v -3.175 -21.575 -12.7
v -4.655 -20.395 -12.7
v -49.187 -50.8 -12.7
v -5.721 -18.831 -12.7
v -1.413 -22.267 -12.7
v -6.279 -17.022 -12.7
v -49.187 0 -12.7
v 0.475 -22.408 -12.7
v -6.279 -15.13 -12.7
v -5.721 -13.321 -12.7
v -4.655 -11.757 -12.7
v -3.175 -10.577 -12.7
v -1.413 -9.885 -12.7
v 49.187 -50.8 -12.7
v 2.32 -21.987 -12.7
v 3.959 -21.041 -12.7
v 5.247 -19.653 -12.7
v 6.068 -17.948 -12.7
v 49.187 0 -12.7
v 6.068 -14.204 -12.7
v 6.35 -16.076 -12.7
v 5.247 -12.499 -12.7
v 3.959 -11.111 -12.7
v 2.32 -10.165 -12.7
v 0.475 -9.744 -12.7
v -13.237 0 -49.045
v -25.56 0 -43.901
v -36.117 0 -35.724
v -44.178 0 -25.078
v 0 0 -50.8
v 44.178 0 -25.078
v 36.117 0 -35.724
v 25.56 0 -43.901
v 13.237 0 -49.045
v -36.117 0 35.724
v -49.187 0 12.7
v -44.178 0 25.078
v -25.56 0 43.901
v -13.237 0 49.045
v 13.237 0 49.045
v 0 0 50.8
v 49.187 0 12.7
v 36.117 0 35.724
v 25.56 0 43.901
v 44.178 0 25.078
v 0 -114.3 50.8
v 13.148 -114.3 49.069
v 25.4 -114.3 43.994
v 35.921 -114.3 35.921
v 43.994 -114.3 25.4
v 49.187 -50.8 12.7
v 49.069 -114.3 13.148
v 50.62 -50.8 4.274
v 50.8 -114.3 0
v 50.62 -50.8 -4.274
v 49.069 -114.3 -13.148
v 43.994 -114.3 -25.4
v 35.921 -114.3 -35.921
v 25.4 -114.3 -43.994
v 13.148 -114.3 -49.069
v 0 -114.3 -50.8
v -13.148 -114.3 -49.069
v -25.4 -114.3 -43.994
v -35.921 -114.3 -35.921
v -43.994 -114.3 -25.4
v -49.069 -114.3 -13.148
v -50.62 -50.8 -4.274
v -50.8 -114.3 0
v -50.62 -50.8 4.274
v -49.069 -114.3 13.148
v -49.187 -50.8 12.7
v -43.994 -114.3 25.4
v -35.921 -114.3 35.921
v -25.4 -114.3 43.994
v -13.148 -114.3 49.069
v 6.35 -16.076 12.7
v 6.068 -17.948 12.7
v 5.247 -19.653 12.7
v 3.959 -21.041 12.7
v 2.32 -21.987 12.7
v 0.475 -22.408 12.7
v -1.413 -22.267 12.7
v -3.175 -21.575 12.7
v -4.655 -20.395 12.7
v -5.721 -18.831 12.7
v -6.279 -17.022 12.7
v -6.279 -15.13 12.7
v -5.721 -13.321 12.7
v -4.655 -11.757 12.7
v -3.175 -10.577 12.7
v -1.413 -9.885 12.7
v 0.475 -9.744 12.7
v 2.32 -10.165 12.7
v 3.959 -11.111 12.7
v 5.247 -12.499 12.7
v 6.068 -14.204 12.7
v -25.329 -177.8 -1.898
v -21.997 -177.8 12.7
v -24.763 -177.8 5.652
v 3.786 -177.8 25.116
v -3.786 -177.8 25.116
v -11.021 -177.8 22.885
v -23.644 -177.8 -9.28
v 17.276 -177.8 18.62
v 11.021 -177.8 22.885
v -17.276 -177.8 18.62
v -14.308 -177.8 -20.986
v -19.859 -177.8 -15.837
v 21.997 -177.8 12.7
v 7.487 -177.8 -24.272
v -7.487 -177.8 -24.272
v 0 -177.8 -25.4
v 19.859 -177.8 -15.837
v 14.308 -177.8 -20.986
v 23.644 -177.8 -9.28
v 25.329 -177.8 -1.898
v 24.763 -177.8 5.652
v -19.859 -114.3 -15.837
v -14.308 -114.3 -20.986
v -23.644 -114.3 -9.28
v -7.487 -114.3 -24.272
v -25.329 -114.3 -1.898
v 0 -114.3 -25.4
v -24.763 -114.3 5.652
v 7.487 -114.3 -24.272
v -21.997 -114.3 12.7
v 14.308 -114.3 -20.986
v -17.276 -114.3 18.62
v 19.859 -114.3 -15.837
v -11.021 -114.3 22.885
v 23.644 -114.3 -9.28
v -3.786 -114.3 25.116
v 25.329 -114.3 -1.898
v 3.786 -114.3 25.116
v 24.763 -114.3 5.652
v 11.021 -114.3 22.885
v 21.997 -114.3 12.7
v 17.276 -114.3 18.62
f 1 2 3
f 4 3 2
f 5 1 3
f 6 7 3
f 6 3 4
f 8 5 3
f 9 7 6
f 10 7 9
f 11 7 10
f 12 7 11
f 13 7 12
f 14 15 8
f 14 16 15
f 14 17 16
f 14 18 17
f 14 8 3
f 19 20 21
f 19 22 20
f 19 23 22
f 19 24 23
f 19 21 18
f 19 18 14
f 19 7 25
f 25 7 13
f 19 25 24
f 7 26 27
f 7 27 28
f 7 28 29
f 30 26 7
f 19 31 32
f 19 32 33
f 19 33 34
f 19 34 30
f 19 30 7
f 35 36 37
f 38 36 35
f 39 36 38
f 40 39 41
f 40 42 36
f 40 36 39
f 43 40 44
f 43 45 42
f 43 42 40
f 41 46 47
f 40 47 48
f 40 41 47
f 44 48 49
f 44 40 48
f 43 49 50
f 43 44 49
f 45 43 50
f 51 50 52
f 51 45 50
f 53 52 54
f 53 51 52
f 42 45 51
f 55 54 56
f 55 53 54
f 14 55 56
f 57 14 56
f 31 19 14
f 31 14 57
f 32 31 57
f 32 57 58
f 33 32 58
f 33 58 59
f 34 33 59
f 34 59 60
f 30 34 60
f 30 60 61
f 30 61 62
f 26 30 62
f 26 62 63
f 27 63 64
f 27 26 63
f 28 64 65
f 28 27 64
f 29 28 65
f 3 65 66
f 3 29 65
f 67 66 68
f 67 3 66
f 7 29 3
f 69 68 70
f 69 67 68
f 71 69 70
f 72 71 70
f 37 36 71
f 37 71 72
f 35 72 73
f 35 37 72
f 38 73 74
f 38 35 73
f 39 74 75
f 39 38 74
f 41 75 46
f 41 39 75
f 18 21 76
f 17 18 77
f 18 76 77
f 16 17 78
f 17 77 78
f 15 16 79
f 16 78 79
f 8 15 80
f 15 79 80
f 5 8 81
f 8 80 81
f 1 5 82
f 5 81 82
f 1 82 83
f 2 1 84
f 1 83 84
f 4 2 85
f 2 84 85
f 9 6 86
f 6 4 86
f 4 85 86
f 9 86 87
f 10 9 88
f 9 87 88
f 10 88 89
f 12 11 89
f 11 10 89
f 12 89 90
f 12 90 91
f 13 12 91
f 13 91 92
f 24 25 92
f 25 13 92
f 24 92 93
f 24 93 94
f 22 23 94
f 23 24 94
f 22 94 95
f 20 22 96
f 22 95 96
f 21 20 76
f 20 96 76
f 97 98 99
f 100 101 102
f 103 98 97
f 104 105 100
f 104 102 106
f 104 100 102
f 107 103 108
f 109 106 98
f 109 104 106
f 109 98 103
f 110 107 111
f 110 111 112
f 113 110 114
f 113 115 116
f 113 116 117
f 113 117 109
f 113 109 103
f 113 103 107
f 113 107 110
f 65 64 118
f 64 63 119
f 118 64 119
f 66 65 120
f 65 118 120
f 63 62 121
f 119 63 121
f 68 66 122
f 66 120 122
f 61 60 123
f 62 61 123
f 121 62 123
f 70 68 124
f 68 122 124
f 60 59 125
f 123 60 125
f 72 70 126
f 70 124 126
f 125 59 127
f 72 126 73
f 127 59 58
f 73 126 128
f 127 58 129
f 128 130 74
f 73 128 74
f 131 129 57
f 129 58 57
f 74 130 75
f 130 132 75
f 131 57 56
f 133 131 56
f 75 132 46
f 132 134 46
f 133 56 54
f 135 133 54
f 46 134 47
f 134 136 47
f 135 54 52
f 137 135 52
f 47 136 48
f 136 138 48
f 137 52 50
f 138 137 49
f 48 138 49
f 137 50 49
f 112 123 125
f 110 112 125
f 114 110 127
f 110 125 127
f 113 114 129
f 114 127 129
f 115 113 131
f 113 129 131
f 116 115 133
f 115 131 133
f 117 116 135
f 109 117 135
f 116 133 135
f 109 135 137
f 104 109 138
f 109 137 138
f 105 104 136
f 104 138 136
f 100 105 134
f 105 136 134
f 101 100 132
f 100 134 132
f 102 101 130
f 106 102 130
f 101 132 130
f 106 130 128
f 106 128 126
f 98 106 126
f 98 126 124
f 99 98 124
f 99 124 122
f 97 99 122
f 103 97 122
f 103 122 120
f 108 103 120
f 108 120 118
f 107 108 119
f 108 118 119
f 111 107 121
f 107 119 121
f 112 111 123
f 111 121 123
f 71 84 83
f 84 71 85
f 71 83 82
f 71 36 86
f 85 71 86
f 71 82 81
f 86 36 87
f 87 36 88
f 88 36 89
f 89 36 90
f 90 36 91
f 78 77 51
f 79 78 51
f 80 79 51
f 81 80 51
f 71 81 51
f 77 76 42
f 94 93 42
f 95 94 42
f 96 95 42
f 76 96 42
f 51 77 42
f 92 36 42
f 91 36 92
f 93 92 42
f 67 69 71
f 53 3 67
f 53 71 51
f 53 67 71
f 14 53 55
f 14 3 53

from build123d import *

# Parameters (mm, degrees)
SKETCH1_R           = 50.8
BOSS_EXTRUDE1_DEPTH = 114.3
SKETCH2_R           = 25.4
BOSS_EXTRUDE2_DEPTH = 63.5
SKETCH3_W           = 130.646832002
SKETCH3_H           = 25.4
CUT_EXTRUDE5_DEPTH  = 50.8
SKETCH5_R           = 6.35
BOSS_EXTRUDE3_DEPTH = 50.8


with BuildPart() as part:
    # Sketch1 → Boss-Extrude1 (new body)
    with BuildSketch(Plane(origin=(0, 0, 0), x_dir=(1, 0, 0), z_dir=(0, 1, 0))):
        with Locations(Location((0, 0, 0), (0, 0, 270))):
            Circle(SKETCH1_R)
    extrude(amount=-BOSS_EXTRUDE1_DEPTH)

    # Sketch2 → Boss-Extrude2 (add)
    with BuildSketch(Plane(origin=(0, -114.3, 0), x_dir=(-1, 0, 0), z_dir=(0, -1, 0))):
        with Locations(Location((0, 0, 0), (0, 0, 90))):
            Circle(SKETCH2_R)
    extrude(amount=BOSS_EXTRUDE2_DEPTH)

    # Sketch3 → Cut-Extrude5 (cut)
    with BuildSketch(Plane(origin=(0, 0, 0), x_dir=(1, 0, 0), z_dir=(0, 1, 0))):
        Rectangle(SKETCH3_W, SKETCH3_H)
    extrude(amount=-CUT_EXTRUDE5_DEPTH, mode=Mode.SUBTRACT)

    # Sketch5 → Boss-Extrude3 (add)
    with BuildSketch(Plane(origin=(0, 0, 12.7), x_dir=(-1, 0, 0), z_dir=(0, 0, -1))):
        with Locations(Location((0, -16.075927957, 0), (0, 0, 180))):
            Circle(SKETCH5_R)
    extrude(amount=BOSS_EXTRUDE3_DEPTH)


solid = part.part
